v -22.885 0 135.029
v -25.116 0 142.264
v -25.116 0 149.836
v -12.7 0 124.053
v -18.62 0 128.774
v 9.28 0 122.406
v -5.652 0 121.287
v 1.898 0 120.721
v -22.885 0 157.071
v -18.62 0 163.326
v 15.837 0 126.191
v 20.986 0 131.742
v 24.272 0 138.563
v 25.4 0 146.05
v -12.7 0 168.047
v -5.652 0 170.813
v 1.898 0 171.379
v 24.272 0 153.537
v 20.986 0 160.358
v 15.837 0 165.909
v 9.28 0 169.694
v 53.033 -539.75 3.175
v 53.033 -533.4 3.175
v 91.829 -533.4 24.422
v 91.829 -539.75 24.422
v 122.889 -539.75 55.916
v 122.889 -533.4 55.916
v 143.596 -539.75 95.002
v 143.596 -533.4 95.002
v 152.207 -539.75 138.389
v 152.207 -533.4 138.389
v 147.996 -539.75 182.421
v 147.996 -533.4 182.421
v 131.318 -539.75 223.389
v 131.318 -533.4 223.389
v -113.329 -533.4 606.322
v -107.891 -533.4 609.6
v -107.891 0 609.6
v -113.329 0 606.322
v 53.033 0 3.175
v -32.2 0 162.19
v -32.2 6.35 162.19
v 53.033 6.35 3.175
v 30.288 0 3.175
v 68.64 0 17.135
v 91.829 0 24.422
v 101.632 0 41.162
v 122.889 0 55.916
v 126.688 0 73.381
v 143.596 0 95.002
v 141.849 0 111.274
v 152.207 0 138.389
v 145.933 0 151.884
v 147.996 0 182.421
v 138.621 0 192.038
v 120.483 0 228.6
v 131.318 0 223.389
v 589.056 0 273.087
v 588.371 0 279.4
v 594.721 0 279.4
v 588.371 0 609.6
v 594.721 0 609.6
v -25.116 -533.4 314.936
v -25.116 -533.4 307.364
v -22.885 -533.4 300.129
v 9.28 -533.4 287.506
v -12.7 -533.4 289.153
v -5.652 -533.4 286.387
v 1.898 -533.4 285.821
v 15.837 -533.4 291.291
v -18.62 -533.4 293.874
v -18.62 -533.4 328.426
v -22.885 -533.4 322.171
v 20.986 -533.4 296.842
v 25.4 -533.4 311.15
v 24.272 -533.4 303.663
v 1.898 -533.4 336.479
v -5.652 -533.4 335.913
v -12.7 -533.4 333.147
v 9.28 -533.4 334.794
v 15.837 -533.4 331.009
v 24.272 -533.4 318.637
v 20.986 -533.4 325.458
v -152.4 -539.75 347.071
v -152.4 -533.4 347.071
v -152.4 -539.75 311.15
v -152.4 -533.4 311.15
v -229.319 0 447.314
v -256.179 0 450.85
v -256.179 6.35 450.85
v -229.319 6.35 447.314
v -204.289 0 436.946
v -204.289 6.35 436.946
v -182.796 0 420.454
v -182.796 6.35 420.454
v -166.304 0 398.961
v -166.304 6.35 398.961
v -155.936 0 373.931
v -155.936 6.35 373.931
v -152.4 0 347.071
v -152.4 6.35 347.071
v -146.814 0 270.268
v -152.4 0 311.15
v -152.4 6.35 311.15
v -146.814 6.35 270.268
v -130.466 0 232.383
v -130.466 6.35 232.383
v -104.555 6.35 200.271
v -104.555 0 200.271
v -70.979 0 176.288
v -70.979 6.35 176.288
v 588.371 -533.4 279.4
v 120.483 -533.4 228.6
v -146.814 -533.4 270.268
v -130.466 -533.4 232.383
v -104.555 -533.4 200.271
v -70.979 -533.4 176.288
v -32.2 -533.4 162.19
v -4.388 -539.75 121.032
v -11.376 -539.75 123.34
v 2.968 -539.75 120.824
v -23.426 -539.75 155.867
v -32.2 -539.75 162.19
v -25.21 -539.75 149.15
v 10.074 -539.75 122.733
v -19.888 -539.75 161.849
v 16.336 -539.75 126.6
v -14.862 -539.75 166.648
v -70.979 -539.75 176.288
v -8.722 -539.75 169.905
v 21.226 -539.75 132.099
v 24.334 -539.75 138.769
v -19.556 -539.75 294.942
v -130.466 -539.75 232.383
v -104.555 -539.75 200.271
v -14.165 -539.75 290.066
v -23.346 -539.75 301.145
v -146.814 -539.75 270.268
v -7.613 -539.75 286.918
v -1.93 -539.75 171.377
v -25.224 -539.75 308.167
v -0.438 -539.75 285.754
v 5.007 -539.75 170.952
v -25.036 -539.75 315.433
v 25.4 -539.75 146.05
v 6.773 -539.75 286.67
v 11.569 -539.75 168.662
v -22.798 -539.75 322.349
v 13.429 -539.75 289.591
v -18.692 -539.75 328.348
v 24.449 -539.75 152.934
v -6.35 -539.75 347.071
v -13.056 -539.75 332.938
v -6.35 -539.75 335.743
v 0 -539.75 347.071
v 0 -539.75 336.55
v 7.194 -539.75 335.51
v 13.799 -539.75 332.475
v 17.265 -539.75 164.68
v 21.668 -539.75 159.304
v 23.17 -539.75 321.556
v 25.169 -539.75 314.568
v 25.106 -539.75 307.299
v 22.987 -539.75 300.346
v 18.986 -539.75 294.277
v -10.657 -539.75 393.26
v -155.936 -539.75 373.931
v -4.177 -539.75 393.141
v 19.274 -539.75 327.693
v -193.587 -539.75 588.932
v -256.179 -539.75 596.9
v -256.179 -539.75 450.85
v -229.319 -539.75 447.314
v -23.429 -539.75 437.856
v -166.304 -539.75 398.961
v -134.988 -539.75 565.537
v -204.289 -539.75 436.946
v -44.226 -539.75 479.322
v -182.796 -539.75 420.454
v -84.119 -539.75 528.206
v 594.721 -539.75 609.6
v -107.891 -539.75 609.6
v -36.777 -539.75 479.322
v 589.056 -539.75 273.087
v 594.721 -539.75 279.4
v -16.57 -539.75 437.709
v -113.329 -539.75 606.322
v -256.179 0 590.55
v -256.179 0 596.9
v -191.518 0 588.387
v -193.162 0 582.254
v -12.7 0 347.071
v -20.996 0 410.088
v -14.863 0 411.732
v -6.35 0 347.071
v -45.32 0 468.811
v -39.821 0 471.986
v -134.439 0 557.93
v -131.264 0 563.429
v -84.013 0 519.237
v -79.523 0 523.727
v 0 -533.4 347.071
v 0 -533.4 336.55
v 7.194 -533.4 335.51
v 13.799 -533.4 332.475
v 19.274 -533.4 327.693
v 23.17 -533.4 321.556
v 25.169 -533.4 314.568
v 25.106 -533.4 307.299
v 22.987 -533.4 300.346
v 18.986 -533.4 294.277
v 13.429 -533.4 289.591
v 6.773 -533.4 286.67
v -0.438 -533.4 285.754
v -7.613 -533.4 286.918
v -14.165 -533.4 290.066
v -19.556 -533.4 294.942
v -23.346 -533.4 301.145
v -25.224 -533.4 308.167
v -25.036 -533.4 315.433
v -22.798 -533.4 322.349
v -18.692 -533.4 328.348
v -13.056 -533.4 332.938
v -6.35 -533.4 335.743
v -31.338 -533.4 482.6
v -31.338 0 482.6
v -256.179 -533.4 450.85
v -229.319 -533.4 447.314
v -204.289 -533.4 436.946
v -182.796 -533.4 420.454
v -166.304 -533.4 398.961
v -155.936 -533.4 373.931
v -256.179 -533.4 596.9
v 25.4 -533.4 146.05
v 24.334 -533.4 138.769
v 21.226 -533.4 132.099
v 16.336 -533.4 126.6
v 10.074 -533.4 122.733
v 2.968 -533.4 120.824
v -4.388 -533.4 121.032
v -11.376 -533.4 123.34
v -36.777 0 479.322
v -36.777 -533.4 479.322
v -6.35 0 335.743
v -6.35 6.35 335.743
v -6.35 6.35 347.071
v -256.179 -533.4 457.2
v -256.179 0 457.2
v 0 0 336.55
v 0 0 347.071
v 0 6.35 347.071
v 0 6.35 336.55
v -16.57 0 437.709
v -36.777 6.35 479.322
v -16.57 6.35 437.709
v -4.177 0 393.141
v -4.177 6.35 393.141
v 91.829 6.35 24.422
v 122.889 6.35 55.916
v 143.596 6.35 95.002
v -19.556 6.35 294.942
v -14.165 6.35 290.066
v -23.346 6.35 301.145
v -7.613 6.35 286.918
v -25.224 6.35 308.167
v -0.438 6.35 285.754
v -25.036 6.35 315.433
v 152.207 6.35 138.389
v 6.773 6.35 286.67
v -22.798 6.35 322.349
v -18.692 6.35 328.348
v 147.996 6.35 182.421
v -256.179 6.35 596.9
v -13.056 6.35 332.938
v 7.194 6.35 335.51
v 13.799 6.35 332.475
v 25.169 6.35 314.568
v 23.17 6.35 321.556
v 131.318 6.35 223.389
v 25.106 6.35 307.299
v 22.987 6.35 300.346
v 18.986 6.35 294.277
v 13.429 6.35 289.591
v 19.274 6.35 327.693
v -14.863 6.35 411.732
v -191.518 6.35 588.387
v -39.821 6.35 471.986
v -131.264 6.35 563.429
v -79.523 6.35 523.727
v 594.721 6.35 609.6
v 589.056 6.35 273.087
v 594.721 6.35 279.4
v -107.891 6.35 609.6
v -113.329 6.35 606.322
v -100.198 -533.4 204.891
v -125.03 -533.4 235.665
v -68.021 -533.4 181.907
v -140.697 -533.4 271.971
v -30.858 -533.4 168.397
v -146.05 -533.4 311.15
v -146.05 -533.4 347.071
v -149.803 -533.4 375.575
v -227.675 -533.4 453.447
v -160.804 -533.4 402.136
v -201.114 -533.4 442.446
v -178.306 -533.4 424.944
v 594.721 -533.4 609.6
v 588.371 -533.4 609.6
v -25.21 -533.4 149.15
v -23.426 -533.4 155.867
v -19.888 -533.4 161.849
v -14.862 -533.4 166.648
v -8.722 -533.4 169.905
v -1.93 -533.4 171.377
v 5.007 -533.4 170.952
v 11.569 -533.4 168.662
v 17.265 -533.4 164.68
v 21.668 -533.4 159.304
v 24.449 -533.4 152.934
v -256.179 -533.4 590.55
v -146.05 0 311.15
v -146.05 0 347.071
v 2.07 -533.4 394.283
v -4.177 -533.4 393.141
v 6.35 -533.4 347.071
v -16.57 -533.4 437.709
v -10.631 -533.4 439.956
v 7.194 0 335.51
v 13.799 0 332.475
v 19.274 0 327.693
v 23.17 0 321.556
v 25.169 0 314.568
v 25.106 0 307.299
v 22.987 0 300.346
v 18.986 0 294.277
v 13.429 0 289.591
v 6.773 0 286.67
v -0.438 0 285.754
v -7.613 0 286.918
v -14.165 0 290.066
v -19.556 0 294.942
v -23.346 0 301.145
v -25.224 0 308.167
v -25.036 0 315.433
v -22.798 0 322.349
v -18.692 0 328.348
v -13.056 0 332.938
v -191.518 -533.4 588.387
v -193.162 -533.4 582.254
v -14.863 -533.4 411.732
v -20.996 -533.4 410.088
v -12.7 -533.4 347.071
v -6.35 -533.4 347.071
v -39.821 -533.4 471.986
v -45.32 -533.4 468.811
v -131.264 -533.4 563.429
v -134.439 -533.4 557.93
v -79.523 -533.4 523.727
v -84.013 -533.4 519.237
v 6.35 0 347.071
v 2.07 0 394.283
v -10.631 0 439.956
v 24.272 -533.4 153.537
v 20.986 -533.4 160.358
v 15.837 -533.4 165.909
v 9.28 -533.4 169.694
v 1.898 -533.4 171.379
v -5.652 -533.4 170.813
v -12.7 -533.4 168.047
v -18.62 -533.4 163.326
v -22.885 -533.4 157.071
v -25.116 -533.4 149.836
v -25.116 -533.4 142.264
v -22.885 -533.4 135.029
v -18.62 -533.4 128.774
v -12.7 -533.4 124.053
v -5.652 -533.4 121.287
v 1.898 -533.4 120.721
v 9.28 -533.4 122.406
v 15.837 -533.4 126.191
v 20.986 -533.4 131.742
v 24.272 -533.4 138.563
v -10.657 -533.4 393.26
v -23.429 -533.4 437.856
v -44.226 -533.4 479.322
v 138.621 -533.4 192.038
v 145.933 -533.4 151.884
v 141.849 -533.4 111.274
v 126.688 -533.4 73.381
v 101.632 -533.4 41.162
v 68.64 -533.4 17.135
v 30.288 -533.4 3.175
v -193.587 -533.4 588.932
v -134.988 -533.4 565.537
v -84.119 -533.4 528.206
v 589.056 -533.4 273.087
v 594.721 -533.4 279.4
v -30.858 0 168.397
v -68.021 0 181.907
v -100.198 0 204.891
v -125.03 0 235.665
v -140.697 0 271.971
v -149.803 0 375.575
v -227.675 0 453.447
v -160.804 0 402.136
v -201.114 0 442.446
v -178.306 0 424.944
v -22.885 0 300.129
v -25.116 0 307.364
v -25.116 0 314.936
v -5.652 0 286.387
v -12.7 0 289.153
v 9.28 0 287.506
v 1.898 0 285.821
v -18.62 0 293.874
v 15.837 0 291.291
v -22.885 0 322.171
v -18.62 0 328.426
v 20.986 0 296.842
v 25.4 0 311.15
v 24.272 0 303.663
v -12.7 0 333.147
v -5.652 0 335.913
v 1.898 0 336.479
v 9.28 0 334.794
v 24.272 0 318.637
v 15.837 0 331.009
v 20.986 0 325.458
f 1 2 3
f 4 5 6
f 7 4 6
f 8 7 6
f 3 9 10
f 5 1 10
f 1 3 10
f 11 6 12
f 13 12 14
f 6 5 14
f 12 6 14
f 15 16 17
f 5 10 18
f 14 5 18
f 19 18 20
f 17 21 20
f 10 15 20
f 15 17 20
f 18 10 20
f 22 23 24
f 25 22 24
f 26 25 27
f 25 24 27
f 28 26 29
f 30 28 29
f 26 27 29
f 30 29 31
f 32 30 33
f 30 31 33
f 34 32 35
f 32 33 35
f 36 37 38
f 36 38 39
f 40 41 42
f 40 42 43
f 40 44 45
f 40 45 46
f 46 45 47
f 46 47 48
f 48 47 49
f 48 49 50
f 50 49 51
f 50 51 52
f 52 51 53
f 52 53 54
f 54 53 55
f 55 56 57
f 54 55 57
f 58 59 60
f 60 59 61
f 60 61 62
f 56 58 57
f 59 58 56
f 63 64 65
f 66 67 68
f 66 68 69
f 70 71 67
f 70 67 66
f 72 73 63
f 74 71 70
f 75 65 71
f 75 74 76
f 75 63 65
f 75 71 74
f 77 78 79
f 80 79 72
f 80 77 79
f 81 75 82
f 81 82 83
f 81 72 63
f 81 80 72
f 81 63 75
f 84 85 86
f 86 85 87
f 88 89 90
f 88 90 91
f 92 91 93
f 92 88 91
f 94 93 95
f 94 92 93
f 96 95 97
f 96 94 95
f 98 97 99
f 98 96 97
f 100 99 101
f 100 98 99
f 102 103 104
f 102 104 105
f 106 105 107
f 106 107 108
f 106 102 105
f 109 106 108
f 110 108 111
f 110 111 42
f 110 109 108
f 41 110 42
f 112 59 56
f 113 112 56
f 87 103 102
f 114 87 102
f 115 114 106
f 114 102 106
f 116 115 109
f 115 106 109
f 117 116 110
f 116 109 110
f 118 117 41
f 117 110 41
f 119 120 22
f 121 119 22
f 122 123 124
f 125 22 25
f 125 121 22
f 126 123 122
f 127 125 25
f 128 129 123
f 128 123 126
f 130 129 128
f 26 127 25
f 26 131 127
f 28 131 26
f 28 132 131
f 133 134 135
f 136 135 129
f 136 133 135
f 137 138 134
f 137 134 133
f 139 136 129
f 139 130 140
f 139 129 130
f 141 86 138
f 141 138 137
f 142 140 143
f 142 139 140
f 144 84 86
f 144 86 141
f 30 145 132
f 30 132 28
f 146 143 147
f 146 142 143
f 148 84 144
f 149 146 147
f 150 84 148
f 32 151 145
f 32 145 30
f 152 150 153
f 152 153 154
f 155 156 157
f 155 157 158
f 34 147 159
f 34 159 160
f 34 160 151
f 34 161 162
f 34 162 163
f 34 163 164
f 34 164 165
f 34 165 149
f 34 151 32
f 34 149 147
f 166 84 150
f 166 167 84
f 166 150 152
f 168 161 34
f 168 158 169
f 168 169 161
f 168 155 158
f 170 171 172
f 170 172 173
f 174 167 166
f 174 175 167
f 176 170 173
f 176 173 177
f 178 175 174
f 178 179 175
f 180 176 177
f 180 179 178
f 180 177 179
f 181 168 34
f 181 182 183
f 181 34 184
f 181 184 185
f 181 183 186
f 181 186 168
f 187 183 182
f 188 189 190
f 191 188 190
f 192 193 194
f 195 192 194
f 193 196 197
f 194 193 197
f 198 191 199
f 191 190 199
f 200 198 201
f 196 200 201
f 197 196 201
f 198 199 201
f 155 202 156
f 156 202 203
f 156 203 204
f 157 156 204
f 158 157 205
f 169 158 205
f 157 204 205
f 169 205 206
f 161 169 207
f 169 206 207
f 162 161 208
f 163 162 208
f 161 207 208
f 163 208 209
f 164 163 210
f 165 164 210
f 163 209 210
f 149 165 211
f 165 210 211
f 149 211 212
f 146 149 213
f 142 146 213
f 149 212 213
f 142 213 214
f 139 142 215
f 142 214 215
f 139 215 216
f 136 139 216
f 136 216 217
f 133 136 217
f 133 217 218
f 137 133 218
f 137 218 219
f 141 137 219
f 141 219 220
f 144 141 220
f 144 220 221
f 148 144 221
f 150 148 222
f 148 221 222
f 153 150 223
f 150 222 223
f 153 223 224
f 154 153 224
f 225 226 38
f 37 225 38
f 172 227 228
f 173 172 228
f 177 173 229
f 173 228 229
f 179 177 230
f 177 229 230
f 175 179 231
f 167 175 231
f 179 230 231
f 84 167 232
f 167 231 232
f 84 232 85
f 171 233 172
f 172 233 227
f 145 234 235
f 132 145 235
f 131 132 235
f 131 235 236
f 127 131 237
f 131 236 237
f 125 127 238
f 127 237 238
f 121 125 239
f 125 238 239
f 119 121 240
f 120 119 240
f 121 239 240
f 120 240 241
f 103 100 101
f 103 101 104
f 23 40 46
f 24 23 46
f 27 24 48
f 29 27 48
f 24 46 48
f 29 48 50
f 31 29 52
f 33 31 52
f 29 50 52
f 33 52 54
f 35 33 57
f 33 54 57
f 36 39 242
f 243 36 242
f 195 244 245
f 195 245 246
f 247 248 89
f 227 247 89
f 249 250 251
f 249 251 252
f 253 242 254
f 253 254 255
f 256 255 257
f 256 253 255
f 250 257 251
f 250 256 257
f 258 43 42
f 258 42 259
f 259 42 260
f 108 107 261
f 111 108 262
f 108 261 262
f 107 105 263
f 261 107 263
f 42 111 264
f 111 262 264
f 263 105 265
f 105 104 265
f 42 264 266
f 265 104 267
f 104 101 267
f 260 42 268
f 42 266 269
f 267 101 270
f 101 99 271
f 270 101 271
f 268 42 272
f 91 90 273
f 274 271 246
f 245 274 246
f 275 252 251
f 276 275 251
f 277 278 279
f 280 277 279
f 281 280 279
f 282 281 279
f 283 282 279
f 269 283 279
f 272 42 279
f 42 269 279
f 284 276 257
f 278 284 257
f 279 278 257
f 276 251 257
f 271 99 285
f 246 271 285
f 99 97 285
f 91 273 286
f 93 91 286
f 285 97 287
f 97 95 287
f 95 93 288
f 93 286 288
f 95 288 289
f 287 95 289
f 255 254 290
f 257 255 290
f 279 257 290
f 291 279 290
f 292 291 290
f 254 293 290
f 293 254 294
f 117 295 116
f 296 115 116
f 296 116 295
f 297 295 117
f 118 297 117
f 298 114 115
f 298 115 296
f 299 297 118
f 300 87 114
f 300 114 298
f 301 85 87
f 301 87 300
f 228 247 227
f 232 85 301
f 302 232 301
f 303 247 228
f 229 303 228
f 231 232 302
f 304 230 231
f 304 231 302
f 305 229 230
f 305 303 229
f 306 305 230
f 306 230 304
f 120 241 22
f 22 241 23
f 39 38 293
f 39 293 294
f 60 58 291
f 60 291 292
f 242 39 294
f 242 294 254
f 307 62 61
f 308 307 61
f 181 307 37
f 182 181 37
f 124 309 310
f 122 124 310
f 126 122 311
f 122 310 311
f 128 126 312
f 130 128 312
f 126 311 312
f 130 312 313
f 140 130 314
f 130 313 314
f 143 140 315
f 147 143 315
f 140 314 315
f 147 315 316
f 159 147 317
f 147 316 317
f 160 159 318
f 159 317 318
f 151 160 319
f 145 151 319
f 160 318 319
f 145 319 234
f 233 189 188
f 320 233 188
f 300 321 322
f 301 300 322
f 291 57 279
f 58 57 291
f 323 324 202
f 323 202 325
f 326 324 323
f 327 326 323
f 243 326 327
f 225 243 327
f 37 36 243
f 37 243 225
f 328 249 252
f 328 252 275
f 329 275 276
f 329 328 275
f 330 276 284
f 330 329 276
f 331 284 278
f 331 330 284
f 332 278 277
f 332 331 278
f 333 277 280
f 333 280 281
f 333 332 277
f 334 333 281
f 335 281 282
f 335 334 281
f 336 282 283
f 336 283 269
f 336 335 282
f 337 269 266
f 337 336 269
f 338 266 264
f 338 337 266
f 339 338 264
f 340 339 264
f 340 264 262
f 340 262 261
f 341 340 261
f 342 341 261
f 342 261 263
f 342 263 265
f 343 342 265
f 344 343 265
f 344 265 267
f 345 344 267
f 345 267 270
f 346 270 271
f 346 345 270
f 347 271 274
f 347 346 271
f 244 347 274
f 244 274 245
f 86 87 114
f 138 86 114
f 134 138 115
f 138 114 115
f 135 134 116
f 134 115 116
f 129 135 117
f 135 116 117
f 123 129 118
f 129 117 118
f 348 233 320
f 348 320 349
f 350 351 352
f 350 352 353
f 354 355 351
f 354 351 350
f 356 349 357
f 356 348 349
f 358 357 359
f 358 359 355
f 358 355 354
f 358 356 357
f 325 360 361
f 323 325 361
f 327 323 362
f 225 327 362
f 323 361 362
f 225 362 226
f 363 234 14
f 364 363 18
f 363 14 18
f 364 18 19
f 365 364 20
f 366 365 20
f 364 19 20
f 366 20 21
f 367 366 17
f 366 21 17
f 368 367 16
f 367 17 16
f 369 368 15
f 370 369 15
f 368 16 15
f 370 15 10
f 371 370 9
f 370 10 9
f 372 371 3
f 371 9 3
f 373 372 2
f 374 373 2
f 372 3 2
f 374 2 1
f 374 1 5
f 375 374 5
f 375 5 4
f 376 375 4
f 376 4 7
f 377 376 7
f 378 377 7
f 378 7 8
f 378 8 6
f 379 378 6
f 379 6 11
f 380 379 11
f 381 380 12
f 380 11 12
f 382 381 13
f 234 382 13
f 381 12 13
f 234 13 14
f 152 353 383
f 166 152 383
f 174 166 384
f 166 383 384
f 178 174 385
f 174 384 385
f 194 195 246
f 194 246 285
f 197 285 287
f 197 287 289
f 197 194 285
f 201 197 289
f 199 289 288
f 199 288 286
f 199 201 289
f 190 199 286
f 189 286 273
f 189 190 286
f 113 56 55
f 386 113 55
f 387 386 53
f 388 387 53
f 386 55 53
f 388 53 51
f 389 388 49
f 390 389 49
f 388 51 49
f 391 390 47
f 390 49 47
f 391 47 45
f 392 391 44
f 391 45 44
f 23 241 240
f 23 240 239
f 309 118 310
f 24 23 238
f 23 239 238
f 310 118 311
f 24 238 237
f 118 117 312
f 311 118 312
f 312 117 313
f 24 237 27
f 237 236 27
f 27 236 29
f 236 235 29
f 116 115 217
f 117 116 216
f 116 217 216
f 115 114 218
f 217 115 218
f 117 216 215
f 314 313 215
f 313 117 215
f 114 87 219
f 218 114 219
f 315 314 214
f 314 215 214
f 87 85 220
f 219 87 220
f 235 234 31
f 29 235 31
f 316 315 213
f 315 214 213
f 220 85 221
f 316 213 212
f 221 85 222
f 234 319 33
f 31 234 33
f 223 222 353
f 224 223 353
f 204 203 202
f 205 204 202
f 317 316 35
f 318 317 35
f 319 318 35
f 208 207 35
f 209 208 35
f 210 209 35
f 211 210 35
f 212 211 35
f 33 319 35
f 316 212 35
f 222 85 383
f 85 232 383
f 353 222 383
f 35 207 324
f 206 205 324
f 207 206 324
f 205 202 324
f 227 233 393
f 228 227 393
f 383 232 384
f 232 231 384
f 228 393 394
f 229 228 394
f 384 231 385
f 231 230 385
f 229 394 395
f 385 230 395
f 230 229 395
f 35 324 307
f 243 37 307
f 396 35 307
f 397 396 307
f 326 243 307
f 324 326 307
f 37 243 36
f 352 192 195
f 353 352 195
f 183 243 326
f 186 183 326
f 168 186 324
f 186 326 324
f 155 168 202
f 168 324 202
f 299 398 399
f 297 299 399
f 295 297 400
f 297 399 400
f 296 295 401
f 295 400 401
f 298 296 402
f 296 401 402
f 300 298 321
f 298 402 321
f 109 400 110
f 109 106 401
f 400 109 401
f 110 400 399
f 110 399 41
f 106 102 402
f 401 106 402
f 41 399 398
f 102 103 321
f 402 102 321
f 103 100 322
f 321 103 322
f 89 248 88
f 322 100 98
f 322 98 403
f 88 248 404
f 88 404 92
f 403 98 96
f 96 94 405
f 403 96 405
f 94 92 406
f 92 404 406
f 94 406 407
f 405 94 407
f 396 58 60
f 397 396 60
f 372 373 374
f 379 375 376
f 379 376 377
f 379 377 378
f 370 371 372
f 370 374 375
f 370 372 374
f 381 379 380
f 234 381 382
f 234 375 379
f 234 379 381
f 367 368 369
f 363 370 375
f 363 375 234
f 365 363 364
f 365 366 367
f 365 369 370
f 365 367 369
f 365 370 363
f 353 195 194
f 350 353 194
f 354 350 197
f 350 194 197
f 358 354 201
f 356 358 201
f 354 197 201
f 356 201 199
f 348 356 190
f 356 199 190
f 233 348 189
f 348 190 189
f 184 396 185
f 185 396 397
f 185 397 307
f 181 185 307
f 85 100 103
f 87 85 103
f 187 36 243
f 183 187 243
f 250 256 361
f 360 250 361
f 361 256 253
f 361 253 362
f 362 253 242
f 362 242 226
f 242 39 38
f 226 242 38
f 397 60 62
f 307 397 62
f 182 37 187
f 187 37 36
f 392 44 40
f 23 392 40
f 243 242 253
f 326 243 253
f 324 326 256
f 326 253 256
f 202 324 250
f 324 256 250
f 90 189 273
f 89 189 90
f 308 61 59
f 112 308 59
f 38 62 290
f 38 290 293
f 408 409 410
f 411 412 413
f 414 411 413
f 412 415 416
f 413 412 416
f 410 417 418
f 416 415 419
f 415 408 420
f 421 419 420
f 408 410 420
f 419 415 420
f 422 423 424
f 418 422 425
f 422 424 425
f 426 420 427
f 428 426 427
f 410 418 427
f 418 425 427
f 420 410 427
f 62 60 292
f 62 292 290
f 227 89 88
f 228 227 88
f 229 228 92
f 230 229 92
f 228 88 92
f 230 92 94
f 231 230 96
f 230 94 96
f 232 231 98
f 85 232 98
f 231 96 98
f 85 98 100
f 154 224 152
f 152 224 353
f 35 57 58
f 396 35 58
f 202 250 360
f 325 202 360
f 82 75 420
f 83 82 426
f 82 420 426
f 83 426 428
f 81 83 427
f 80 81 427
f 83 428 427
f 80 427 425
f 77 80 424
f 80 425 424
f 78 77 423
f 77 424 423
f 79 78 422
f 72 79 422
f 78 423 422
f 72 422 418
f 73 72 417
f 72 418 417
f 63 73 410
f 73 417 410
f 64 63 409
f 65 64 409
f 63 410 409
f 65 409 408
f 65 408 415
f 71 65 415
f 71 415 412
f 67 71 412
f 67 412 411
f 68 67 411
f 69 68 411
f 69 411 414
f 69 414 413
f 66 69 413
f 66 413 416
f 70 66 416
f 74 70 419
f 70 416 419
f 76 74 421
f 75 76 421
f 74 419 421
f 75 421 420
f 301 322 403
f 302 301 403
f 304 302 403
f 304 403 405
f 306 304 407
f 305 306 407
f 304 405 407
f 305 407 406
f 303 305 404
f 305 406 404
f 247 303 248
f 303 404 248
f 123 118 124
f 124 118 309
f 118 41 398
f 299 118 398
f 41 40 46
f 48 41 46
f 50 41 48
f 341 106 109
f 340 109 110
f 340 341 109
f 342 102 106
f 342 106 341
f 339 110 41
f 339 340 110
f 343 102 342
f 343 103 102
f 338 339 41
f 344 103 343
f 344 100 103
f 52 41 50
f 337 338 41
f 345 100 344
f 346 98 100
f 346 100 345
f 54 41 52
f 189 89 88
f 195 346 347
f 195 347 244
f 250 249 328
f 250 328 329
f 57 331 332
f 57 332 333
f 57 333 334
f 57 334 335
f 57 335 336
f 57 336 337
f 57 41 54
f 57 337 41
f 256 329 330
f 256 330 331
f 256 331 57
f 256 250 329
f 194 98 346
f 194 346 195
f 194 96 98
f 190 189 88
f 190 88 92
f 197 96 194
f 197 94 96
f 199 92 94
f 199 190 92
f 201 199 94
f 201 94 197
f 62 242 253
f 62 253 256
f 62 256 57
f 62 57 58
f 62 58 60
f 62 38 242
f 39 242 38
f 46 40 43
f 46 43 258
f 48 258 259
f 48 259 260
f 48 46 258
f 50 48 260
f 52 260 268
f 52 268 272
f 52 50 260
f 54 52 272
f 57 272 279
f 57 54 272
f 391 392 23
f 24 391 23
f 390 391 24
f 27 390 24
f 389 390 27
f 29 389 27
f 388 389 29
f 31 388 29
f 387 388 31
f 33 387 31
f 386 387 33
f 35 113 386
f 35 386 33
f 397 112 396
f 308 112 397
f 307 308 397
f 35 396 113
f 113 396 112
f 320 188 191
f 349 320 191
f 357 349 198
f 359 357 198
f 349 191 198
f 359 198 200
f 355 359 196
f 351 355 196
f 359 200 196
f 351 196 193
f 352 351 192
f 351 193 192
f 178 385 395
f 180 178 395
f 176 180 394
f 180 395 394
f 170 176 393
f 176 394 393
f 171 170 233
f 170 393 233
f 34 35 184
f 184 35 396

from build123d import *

# Parameters (mm, degrees)
F0_R     = 25.4
F1_DEPTH = 533.4
F3_DEPTH = 6.35
F5_DEPTH = 6.35


with BuildPart() as f1:
    # F0 (on Front) → F1 (new body)
    with BuildSketch(Plane.XZ):
        with Locations((0, 146.05)):
            Circle(F0_R)
        with BuildLine():
            Line((-32.199657, 162.190468), (-30.858004, 168.397115))
            ThreePointArc((-30.858004, 168.397115), (-113.66049, 219.433614), (-146.05, 311.15))
            Line((-146.05, 311.15), (-146.05, 347.071024))
            ThreePointArc((-146.05, 347.071024), (-178.30603, 424.94397), (-256.178976, 457.2))
            Line((-256.178976, 457.2), (-256.178976, 450.85))
            ThreePointArc((-256.178976, 450.85), (-182.796158, 420.453842), (-152.4, 347.071024))
            Line((-152.4, 347.071024), (-152.4, 311.15))
            ThreePointArc((-152.4, 311.15), (-118.602251, 215.445945), (-32.199657, 162.190468))
        make_face()
        with Locations((0, 311.15)):
            Circle(F0_R)
        with BuildLine():
            Line((-31.338232, 482.6), (-107.890994, 609.6))
            Line((-107.890994, 609.6), (-113.329399, 606.321851))
            Line((-113.329399, 606.321851), (-36.776637, 479.321851))
            ThreePointArc((-36.776637, 479.321851), (-9.365348, 415.705568), (0, 347.071024))
            Line((0, 347.071024), (6.35, 347.071024))
            ThreePointArc((6.35, 347.071024), (-3.24749, 417.406837), (-31.338232, 482.6))
        make_face()
        with BuildLine():
            ThreePointArc((120.482779, 228.6), (135.598791, 91.79532), (30.28757, 3.175))
            Line((30.28757, 3.175), (53.032956, 3.175))
            ThreePointArc((53.032956, 3.175), (143.596251, 95.002211), (131.318026, 223.389097))
            Line((131.318026, 223.389097), (589.056435, 273.087099))
            Line((589.056435, 273.087099), (594.721024, 279.4))
            Line((594.721024, 279.4), (594.721024, 609.6))
            Line((594.721024, 609.6), (588.371024, 609.6))
            Line((588.371024, 609.6), (588.371024, 279.4))
            Line((588.371024, 279.4), (120.482779, 228.6))
        make_face()
        with BuildLine():
            Line((-256.178976, 596.9), (-256.178976, 590.55))
            ThreePointArc((-256.178976, 590.55), (-84.013341, 519.236659), (-12.7, 347.071024))
            Line((-12.7, 347.071024), (-6.35, 347.071024))
            ThreePointArc((-6.35, 347.071024), (-79.523213, 523.726787), (-256.178976, 596.9))
        make_face()
    extrude(amount=F1_DEPTH)


with BuildPart() as f3:
    # F2 (on Front) → F3 (new body)
    with BuildSketch(Plane.XZ):
        with BuildLine():
            Line((-113.329399, 606.321851), (-36.776637, 479.321851))
            ThreePointArc((-36.776637, 479.321851), (-9.365348, 415.705568), (0, 347.071024))
            Line((0, 347.071024), (0, 336.55))
            ThreePointArc((0, 336.55), (3.200509, 285.952446), (-6.35, 335.743444))
            Line((-6.35, 335.743444), (-6.35, 347.071024))
            ThreePointArc((-6.35, 347.071024), (-79.523213, 523.726787), (-256.178976, 596.9))
            Line((-256.178976, 596.9), (-256.178976, 450.85))
            ThreePointArc((-256.178976, 450.85), (-182.796158, 420.453842), (-152.4, 347.071024))
            Line((-152.4, 347.071024), (-152.4, 311.15))
            ThreePointArc((-152.4, 311.15), (-118.602251, 215.445945), (-32.199657, 162.190468))
            Line((-32.199657, 162.190468), (53.032956, 3.175))
            ThreePointArc((53.032956, 3.175), (143.596251, 95.002211), (131.318026, 223.389097))
            Line((131.318026, 223.389097), (589.056435, 273.087099))
            Line((589.056435, 273.087099), (594.721024, 279.4))
            Line((594.721024, 279.4), (594.721024, 609.6))
            Line((594.721024, 609.6), (588.371024, 609.6))
            Line((588.371024, 609.6), (-107.890994, 609.6))
            Line((-107.890994, 609.6), (-113.329399, 606.321851))
        make_face()
    extrude(amount=-F3_DEPTH)


with BuildPart() as f5:
    # F4 (on face) → F5 (new body)
    with BuildSketch(Plane.XZ.offset(533.4)):
        with BuildLine():
            Line((-152.4, 347.071024), (-152.4, 311.15))
            ThreePointArc((-152.4, 311.15), (-118.602251, 215.445945), (-32.199657, 162.190468))
            Line((-32.199657, 162.190468), (-25.210084, 149.15027))
            ThreePointArc((-25.210084, 149.15027), (1.55304, 171.402477), (25.4, 146.05))
            ThreePointArc((25.4, 146.05), (13.345788, 124.438662), (-11.375586, 123.339737))
            Line((-11.375586, 123.339737), (53.032956, 3.175))
            ThreePointArc((53.032956, 3.175), (143.596251, 95.002211), (131.318026, 223.389097))
            Line((131.318026, 223.389097), (589.056435, 273.087099))
            Line((589.056435, 273.087099), (594.721024, 279.4))
            Line((594.721024, 279.4), (594.721024, 609.6))
            Line((594.721024, 609.6), (-107.890994, 609.6))
            Line((-107.890994, 609.6), (-113.329399, 606.321851))
            Line((-113.329399, 606.321851), (-36.776637, 479.321851))
            ThreePointArc((-36.776637, 479.321851), (-9.365348, 415.705568), (0, 347.071024))
            Line((0, 347.071024), (0, 336.55))
            ThreePointArc((0, 336.55), (3.200509, 285.952446), (-6.35, 335.743444))
            Line((-6.35, 335.743444), (-6.35, 347.071024))
            ThreePointArc((-6.35, 347.071024), (-16.005483, 415.85482), (-44.225594, 479.321851))
            ThreePointArc((-44.225594, 479.321851), (-134.988158, 565.536818), (-256.178976, 596.9))
            Line((-256.178976, 596.9), (-256.178976, 450.85))
            ThreePointArc((-256.178976, 450.85), (-182.796158, 420.453842), (-152.4, 347.071024))
        make_face()
    extrude(amount=F5_DEPTH)


solid = Compound([f1.part, f3.part, f5.part])
